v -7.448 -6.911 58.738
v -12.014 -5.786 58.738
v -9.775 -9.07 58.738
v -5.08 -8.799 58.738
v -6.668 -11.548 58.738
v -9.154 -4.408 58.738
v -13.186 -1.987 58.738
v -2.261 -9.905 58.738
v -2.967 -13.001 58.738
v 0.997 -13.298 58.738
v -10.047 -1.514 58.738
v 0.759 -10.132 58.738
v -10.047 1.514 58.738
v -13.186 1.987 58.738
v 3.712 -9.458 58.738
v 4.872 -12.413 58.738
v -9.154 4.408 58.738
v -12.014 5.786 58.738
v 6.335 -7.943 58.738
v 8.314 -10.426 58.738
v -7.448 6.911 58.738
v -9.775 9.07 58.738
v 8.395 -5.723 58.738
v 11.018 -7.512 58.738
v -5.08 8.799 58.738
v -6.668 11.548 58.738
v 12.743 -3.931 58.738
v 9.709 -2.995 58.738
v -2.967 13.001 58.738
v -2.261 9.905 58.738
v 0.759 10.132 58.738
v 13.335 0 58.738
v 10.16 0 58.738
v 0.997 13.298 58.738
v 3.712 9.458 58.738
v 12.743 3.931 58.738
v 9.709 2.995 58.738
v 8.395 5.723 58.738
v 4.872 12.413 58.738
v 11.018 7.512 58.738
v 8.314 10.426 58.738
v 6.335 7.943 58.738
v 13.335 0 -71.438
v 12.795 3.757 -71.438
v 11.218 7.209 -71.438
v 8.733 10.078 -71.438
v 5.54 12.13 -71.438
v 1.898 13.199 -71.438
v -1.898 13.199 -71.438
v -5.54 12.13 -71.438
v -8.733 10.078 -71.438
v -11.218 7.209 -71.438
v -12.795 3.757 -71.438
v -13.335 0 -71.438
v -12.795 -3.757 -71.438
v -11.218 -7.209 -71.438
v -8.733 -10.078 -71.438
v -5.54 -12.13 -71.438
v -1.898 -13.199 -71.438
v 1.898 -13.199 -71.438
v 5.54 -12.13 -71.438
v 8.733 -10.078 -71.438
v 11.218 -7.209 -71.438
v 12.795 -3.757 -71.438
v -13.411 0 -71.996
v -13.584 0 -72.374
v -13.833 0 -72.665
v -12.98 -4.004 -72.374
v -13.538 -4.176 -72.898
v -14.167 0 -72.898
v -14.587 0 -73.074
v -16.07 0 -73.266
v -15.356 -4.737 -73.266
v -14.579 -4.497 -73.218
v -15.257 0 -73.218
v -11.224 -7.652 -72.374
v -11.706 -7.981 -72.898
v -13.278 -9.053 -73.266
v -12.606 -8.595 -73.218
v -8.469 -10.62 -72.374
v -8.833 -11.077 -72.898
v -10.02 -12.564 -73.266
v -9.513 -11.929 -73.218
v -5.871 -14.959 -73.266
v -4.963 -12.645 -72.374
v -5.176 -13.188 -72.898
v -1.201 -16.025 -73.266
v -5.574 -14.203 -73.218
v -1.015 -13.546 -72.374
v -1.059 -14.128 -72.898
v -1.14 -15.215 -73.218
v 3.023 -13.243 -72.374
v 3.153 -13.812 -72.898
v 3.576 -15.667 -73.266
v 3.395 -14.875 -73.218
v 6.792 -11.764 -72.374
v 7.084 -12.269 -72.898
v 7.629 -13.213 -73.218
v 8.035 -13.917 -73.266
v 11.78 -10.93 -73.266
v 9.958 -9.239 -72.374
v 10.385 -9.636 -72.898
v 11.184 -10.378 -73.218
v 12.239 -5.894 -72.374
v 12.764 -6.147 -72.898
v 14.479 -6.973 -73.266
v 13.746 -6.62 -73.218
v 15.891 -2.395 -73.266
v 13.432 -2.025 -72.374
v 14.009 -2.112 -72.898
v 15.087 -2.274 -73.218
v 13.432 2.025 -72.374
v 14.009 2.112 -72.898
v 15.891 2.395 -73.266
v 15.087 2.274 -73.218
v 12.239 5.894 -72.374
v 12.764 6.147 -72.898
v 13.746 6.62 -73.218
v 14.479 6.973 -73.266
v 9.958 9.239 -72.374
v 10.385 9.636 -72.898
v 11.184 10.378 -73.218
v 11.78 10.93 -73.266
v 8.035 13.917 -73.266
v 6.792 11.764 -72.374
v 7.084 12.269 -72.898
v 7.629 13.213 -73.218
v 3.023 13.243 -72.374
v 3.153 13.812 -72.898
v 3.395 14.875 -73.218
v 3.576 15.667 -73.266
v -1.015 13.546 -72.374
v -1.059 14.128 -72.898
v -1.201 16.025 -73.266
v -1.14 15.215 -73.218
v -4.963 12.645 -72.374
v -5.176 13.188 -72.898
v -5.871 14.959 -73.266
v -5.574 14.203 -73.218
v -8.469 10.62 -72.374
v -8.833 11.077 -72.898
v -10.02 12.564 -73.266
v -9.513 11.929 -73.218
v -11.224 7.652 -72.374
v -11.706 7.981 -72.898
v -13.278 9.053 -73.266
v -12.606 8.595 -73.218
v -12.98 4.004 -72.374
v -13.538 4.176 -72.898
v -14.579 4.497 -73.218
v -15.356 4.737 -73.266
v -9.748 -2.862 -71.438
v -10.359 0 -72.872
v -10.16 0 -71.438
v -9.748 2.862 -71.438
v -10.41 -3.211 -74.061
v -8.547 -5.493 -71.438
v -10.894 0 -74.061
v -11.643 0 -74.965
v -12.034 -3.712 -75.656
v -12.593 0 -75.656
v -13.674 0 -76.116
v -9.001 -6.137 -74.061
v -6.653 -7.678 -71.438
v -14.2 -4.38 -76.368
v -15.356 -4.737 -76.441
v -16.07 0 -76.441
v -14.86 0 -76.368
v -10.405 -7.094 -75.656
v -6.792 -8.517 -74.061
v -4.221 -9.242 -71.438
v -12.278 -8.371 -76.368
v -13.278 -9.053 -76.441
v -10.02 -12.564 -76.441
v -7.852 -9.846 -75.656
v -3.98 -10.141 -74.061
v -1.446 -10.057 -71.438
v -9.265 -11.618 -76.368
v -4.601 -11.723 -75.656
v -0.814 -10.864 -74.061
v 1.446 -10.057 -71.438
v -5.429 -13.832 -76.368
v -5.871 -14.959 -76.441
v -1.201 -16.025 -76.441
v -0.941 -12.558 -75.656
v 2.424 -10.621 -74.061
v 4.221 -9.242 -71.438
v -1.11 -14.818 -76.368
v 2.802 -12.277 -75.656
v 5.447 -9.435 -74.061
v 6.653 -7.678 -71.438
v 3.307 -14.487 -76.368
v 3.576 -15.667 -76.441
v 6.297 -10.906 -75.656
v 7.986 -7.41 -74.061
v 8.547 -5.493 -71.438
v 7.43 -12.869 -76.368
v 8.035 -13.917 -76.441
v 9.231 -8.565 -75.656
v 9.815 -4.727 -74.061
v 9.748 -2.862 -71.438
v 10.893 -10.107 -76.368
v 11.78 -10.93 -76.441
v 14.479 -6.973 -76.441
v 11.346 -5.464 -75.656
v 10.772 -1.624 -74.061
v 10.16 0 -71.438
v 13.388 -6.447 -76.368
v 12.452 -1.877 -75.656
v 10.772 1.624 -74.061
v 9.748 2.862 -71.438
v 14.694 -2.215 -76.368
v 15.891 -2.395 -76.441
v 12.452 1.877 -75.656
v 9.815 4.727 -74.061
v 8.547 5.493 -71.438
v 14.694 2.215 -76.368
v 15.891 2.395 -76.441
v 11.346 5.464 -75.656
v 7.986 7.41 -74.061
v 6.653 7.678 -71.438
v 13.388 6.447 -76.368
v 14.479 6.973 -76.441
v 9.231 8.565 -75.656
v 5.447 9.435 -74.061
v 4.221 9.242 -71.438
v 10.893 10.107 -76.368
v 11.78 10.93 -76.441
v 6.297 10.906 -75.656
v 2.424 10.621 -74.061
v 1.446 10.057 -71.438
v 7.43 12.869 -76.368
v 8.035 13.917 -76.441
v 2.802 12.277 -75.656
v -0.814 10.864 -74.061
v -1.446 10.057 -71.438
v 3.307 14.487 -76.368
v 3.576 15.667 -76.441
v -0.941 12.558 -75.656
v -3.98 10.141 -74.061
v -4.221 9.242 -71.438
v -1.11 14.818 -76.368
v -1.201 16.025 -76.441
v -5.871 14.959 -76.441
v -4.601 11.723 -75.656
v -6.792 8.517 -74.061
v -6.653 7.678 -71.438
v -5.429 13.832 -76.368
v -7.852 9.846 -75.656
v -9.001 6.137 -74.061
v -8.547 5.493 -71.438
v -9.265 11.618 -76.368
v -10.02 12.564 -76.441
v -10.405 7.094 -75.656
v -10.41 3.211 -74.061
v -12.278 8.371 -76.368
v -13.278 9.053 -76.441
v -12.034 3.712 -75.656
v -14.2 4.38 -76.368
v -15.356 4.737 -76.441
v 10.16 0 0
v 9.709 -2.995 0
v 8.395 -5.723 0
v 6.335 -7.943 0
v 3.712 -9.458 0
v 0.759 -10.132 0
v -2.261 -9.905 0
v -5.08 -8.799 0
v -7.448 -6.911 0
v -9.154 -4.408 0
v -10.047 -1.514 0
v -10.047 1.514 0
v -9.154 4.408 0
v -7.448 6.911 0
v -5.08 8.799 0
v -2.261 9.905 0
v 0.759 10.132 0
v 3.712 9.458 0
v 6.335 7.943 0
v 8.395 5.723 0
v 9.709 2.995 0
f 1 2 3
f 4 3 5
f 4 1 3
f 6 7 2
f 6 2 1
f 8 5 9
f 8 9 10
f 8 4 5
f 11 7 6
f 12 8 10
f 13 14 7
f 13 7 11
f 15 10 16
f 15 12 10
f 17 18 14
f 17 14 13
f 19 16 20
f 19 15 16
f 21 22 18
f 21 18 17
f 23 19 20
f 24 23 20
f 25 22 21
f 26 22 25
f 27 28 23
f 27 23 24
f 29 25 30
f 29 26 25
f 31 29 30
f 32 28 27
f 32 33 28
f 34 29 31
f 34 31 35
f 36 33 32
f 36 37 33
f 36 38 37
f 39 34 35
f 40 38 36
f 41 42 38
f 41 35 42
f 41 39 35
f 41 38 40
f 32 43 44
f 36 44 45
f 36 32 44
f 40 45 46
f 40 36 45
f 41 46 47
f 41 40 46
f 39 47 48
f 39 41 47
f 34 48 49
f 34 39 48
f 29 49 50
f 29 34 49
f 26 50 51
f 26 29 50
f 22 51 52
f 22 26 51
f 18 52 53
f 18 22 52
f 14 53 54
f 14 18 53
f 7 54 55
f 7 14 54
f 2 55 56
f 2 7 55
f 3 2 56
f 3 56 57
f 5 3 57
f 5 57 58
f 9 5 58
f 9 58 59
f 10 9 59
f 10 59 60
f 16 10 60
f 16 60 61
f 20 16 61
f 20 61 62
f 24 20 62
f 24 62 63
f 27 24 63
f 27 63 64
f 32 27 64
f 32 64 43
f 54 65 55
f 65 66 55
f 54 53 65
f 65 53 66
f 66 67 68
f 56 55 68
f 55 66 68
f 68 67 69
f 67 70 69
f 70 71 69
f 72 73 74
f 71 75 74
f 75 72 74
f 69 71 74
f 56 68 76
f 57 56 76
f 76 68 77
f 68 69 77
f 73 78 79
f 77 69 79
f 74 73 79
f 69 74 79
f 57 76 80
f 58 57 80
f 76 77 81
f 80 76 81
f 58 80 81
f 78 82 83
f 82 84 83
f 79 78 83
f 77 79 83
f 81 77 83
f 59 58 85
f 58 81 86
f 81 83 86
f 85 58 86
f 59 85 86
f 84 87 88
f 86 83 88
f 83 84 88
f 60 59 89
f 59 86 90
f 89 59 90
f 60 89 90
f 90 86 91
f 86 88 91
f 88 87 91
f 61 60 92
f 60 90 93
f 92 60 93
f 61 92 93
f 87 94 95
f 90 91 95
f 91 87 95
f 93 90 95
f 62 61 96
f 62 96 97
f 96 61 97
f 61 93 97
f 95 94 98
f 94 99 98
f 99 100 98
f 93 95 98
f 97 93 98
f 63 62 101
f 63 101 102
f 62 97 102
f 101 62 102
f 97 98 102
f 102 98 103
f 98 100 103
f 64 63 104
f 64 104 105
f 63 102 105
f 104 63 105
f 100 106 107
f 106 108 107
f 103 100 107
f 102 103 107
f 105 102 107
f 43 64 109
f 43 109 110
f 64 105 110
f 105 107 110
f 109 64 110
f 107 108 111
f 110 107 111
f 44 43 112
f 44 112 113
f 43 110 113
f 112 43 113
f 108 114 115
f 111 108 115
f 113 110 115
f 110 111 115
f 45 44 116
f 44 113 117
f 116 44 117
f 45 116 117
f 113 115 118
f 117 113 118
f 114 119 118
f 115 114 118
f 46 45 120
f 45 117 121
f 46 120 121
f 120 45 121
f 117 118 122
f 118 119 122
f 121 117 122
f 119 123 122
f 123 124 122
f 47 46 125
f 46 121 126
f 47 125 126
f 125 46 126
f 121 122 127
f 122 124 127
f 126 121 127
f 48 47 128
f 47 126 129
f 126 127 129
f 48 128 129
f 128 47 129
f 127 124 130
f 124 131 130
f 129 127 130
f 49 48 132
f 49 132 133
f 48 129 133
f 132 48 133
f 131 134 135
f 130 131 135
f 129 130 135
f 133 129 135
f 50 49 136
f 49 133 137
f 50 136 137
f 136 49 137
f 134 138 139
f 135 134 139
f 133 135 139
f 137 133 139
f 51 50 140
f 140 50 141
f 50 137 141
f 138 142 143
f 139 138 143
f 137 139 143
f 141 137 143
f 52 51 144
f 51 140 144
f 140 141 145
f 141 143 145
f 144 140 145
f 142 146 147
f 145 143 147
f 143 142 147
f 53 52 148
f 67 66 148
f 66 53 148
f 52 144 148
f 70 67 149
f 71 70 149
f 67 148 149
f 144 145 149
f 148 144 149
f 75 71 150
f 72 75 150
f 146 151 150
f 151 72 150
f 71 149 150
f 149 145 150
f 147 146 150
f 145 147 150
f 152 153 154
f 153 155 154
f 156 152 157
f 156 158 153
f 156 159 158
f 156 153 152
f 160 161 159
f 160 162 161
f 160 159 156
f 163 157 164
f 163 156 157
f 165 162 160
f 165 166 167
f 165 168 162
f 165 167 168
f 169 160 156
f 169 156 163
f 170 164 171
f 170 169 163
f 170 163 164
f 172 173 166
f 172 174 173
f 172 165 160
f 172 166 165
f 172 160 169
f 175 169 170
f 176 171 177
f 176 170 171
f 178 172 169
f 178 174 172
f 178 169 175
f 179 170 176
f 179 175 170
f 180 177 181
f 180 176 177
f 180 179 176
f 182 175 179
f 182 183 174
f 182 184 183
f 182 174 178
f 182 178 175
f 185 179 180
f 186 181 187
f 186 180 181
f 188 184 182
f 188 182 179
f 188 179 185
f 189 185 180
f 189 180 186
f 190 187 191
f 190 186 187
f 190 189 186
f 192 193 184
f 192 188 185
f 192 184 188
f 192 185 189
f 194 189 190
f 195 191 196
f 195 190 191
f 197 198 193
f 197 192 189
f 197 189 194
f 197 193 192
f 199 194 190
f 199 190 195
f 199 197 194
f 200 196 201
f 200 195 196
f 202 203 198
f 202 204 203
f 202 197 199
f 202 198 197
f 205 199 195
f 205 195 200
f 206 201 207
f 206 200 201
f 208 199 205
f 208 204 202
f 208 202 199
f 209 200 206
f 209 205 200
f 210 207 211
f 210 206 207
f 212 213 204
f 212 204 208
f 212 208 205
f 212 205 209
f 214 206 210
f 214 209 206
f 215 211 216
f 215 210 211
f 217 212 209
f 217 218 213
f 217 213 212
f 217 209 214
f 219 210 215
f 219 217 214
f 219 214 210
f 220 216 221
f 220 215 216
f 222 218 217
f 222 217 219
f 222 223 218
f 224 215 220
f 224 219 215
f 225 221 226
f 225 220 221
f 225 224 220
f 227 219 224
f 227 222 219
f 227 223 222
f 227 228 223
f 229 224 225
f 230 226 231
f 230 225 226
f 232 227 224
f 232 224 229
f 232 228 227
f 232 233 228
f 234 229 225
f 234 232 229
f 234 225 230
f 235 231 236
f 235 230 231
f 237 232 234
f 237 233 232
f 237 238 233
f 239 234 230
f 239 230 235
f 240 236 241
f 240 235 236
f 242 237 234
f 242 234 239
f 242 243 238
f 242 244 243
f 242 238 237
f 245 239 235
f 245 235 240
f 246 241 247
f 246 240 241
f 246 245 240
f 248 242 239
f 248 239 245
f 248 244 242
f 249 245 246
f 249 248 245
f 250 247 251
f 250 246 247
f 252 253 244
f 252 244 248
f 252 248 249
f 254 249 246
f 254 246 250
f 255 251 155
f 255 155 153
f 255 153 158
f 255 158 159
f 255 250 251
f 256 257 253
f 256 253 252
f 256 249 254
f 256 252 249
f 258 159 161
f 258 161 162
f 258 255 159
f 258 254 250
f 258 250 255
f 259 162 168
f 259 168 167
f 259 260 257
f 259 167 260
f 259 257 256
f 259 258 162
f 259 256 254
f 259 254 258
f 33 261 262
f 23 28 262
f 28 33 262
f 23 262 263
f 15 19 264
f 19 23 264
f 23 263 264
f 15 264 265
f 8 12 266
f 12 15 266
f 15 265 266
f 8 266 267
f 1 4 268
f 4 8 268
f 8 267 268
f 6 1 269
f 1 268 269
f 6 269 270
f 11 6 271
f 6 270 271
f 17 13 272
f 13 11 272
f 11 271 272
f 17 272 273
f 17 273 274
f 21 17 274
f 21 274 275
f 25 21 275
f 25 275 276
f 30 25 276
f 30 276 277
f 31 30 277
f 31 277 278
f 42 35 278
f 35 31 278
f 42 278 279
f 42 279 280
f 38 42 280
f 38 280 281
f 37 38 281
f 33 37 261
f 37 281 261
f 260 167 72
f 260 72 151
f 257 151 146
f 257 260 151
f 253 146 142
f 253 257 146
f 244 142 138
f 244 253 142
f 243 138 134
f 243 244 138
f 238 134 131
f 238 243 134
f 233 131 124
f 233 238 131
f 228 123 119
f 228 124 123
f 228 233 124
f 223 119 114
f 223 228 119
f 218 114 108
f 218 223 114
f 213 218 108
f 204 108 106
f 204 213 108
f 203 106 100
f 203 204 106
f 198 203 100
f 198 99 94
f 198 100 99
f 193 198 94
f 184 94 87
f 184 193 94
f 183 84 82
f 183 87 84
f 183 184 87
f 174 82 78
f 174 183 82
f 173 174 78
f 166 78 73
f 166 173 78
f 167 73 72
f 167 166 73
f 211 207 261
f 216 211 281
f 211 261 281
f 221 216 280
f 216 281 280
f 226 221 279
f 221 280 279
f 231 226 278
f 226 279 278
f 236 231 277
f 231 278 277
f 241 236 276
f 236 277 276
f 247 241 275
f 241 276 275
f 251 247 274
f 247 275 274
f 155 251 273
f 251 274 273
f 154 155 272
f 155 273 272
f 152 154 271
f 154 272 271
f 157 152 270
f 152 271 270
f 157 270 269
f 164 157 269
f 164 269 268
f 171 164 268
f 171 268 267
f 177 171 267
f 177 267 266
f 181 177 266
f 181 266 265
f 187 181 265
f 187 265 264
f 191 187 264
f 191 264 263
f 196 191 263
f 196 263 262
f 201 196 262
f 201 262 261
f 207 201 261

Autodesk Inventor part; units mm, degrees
ref_plane "YZ Plane" through (0, 0, 0) normal (1, 0, 0) x (0, 1, 0)
ref_plane "XZ Plane" through (0, 0, 0) normal (0, 1, 0) x (-1, 0, 0)
ref_plane "XY Plane" through (0, 0, 0) normal (0, 0, 1) x (1, 0, 0)
sketch "Sketch1" plane through (0, 0, 0) normal (0, 0, 1) x (1, 0, 0)
  circle A0 centre (0, 0) radius 13.335
  circle A1 centre (0, 0) radius 10.16
  dimension "d1" = 20.32
  dimension "d5" = 26.67
extrude "Extrusion1" add sketch "Sketch1" along normal blind 58.7375 and the other way blind 71.4375
sketch "Sketch2" plane through (0, 0, 0) normal (0, 1, 0) x (-1, 0, 0)
  line L0 (10.16, -71.4375) -> (10.16, 58.7375) construction
  line L1 (10.16, 58.7375) -> (13.335, 58.7375) construction
  line L2 (13.335, 58.7375) -> (13.335, -71.4375) construction
  line L3 (13.335, -71.4375) -> (10.16, -71.4375) projected
  line L4 (-10.16, 58.7375) -> (-10.16, -71.4375) construction
  line L5 (-10.16, -71.4375) -> (-13.335, -71.4375) construction
  line L6 (-13.335, -71.4375) -> (-13.335, 58.7375) construction
  line L7 (-13.335, 58.7375) -> (-10.16, 58.7375) construction
  line L8 (13.335, -71.4375) -> (13.335, -73.2656) construction
  line L9 (13.335, -73.2656) -> (16.0701, -73.2656) construction
  spline S0 degree 2 poles (13.335, -71.4375) (13.335, -73.2656) (16.0701, -73.2656) knots 1 1 1 2 2 2
  line L10 (16.0701, -73.2656) -> (16.0701, -76.4406)
  line L11 (0, -105.1255) -> (0, 86.048) projected
  spline S1 degree 5 poles (10.16, -71.4375) (10.1607, -72.3811) (10.3553, -73.3253) (10.8096, -74.2133) (12.0296, -75.5264) (13.675, -76.2036) (14.4712, -76.3698) (15.2694, -76.4406) (16.0701, -76.4406) knots 0 0 0 0 0 0 0.54113 0.54113 0.54113 1 1 1 1 1 1
  point P0 (0, 0)
revolve "Revolution1" add sketch "Sketch2" angle 360 about axis through (0, 0, -10) along (0, 0, 1)
properties part number "pipe" material "PVC-Piping"
